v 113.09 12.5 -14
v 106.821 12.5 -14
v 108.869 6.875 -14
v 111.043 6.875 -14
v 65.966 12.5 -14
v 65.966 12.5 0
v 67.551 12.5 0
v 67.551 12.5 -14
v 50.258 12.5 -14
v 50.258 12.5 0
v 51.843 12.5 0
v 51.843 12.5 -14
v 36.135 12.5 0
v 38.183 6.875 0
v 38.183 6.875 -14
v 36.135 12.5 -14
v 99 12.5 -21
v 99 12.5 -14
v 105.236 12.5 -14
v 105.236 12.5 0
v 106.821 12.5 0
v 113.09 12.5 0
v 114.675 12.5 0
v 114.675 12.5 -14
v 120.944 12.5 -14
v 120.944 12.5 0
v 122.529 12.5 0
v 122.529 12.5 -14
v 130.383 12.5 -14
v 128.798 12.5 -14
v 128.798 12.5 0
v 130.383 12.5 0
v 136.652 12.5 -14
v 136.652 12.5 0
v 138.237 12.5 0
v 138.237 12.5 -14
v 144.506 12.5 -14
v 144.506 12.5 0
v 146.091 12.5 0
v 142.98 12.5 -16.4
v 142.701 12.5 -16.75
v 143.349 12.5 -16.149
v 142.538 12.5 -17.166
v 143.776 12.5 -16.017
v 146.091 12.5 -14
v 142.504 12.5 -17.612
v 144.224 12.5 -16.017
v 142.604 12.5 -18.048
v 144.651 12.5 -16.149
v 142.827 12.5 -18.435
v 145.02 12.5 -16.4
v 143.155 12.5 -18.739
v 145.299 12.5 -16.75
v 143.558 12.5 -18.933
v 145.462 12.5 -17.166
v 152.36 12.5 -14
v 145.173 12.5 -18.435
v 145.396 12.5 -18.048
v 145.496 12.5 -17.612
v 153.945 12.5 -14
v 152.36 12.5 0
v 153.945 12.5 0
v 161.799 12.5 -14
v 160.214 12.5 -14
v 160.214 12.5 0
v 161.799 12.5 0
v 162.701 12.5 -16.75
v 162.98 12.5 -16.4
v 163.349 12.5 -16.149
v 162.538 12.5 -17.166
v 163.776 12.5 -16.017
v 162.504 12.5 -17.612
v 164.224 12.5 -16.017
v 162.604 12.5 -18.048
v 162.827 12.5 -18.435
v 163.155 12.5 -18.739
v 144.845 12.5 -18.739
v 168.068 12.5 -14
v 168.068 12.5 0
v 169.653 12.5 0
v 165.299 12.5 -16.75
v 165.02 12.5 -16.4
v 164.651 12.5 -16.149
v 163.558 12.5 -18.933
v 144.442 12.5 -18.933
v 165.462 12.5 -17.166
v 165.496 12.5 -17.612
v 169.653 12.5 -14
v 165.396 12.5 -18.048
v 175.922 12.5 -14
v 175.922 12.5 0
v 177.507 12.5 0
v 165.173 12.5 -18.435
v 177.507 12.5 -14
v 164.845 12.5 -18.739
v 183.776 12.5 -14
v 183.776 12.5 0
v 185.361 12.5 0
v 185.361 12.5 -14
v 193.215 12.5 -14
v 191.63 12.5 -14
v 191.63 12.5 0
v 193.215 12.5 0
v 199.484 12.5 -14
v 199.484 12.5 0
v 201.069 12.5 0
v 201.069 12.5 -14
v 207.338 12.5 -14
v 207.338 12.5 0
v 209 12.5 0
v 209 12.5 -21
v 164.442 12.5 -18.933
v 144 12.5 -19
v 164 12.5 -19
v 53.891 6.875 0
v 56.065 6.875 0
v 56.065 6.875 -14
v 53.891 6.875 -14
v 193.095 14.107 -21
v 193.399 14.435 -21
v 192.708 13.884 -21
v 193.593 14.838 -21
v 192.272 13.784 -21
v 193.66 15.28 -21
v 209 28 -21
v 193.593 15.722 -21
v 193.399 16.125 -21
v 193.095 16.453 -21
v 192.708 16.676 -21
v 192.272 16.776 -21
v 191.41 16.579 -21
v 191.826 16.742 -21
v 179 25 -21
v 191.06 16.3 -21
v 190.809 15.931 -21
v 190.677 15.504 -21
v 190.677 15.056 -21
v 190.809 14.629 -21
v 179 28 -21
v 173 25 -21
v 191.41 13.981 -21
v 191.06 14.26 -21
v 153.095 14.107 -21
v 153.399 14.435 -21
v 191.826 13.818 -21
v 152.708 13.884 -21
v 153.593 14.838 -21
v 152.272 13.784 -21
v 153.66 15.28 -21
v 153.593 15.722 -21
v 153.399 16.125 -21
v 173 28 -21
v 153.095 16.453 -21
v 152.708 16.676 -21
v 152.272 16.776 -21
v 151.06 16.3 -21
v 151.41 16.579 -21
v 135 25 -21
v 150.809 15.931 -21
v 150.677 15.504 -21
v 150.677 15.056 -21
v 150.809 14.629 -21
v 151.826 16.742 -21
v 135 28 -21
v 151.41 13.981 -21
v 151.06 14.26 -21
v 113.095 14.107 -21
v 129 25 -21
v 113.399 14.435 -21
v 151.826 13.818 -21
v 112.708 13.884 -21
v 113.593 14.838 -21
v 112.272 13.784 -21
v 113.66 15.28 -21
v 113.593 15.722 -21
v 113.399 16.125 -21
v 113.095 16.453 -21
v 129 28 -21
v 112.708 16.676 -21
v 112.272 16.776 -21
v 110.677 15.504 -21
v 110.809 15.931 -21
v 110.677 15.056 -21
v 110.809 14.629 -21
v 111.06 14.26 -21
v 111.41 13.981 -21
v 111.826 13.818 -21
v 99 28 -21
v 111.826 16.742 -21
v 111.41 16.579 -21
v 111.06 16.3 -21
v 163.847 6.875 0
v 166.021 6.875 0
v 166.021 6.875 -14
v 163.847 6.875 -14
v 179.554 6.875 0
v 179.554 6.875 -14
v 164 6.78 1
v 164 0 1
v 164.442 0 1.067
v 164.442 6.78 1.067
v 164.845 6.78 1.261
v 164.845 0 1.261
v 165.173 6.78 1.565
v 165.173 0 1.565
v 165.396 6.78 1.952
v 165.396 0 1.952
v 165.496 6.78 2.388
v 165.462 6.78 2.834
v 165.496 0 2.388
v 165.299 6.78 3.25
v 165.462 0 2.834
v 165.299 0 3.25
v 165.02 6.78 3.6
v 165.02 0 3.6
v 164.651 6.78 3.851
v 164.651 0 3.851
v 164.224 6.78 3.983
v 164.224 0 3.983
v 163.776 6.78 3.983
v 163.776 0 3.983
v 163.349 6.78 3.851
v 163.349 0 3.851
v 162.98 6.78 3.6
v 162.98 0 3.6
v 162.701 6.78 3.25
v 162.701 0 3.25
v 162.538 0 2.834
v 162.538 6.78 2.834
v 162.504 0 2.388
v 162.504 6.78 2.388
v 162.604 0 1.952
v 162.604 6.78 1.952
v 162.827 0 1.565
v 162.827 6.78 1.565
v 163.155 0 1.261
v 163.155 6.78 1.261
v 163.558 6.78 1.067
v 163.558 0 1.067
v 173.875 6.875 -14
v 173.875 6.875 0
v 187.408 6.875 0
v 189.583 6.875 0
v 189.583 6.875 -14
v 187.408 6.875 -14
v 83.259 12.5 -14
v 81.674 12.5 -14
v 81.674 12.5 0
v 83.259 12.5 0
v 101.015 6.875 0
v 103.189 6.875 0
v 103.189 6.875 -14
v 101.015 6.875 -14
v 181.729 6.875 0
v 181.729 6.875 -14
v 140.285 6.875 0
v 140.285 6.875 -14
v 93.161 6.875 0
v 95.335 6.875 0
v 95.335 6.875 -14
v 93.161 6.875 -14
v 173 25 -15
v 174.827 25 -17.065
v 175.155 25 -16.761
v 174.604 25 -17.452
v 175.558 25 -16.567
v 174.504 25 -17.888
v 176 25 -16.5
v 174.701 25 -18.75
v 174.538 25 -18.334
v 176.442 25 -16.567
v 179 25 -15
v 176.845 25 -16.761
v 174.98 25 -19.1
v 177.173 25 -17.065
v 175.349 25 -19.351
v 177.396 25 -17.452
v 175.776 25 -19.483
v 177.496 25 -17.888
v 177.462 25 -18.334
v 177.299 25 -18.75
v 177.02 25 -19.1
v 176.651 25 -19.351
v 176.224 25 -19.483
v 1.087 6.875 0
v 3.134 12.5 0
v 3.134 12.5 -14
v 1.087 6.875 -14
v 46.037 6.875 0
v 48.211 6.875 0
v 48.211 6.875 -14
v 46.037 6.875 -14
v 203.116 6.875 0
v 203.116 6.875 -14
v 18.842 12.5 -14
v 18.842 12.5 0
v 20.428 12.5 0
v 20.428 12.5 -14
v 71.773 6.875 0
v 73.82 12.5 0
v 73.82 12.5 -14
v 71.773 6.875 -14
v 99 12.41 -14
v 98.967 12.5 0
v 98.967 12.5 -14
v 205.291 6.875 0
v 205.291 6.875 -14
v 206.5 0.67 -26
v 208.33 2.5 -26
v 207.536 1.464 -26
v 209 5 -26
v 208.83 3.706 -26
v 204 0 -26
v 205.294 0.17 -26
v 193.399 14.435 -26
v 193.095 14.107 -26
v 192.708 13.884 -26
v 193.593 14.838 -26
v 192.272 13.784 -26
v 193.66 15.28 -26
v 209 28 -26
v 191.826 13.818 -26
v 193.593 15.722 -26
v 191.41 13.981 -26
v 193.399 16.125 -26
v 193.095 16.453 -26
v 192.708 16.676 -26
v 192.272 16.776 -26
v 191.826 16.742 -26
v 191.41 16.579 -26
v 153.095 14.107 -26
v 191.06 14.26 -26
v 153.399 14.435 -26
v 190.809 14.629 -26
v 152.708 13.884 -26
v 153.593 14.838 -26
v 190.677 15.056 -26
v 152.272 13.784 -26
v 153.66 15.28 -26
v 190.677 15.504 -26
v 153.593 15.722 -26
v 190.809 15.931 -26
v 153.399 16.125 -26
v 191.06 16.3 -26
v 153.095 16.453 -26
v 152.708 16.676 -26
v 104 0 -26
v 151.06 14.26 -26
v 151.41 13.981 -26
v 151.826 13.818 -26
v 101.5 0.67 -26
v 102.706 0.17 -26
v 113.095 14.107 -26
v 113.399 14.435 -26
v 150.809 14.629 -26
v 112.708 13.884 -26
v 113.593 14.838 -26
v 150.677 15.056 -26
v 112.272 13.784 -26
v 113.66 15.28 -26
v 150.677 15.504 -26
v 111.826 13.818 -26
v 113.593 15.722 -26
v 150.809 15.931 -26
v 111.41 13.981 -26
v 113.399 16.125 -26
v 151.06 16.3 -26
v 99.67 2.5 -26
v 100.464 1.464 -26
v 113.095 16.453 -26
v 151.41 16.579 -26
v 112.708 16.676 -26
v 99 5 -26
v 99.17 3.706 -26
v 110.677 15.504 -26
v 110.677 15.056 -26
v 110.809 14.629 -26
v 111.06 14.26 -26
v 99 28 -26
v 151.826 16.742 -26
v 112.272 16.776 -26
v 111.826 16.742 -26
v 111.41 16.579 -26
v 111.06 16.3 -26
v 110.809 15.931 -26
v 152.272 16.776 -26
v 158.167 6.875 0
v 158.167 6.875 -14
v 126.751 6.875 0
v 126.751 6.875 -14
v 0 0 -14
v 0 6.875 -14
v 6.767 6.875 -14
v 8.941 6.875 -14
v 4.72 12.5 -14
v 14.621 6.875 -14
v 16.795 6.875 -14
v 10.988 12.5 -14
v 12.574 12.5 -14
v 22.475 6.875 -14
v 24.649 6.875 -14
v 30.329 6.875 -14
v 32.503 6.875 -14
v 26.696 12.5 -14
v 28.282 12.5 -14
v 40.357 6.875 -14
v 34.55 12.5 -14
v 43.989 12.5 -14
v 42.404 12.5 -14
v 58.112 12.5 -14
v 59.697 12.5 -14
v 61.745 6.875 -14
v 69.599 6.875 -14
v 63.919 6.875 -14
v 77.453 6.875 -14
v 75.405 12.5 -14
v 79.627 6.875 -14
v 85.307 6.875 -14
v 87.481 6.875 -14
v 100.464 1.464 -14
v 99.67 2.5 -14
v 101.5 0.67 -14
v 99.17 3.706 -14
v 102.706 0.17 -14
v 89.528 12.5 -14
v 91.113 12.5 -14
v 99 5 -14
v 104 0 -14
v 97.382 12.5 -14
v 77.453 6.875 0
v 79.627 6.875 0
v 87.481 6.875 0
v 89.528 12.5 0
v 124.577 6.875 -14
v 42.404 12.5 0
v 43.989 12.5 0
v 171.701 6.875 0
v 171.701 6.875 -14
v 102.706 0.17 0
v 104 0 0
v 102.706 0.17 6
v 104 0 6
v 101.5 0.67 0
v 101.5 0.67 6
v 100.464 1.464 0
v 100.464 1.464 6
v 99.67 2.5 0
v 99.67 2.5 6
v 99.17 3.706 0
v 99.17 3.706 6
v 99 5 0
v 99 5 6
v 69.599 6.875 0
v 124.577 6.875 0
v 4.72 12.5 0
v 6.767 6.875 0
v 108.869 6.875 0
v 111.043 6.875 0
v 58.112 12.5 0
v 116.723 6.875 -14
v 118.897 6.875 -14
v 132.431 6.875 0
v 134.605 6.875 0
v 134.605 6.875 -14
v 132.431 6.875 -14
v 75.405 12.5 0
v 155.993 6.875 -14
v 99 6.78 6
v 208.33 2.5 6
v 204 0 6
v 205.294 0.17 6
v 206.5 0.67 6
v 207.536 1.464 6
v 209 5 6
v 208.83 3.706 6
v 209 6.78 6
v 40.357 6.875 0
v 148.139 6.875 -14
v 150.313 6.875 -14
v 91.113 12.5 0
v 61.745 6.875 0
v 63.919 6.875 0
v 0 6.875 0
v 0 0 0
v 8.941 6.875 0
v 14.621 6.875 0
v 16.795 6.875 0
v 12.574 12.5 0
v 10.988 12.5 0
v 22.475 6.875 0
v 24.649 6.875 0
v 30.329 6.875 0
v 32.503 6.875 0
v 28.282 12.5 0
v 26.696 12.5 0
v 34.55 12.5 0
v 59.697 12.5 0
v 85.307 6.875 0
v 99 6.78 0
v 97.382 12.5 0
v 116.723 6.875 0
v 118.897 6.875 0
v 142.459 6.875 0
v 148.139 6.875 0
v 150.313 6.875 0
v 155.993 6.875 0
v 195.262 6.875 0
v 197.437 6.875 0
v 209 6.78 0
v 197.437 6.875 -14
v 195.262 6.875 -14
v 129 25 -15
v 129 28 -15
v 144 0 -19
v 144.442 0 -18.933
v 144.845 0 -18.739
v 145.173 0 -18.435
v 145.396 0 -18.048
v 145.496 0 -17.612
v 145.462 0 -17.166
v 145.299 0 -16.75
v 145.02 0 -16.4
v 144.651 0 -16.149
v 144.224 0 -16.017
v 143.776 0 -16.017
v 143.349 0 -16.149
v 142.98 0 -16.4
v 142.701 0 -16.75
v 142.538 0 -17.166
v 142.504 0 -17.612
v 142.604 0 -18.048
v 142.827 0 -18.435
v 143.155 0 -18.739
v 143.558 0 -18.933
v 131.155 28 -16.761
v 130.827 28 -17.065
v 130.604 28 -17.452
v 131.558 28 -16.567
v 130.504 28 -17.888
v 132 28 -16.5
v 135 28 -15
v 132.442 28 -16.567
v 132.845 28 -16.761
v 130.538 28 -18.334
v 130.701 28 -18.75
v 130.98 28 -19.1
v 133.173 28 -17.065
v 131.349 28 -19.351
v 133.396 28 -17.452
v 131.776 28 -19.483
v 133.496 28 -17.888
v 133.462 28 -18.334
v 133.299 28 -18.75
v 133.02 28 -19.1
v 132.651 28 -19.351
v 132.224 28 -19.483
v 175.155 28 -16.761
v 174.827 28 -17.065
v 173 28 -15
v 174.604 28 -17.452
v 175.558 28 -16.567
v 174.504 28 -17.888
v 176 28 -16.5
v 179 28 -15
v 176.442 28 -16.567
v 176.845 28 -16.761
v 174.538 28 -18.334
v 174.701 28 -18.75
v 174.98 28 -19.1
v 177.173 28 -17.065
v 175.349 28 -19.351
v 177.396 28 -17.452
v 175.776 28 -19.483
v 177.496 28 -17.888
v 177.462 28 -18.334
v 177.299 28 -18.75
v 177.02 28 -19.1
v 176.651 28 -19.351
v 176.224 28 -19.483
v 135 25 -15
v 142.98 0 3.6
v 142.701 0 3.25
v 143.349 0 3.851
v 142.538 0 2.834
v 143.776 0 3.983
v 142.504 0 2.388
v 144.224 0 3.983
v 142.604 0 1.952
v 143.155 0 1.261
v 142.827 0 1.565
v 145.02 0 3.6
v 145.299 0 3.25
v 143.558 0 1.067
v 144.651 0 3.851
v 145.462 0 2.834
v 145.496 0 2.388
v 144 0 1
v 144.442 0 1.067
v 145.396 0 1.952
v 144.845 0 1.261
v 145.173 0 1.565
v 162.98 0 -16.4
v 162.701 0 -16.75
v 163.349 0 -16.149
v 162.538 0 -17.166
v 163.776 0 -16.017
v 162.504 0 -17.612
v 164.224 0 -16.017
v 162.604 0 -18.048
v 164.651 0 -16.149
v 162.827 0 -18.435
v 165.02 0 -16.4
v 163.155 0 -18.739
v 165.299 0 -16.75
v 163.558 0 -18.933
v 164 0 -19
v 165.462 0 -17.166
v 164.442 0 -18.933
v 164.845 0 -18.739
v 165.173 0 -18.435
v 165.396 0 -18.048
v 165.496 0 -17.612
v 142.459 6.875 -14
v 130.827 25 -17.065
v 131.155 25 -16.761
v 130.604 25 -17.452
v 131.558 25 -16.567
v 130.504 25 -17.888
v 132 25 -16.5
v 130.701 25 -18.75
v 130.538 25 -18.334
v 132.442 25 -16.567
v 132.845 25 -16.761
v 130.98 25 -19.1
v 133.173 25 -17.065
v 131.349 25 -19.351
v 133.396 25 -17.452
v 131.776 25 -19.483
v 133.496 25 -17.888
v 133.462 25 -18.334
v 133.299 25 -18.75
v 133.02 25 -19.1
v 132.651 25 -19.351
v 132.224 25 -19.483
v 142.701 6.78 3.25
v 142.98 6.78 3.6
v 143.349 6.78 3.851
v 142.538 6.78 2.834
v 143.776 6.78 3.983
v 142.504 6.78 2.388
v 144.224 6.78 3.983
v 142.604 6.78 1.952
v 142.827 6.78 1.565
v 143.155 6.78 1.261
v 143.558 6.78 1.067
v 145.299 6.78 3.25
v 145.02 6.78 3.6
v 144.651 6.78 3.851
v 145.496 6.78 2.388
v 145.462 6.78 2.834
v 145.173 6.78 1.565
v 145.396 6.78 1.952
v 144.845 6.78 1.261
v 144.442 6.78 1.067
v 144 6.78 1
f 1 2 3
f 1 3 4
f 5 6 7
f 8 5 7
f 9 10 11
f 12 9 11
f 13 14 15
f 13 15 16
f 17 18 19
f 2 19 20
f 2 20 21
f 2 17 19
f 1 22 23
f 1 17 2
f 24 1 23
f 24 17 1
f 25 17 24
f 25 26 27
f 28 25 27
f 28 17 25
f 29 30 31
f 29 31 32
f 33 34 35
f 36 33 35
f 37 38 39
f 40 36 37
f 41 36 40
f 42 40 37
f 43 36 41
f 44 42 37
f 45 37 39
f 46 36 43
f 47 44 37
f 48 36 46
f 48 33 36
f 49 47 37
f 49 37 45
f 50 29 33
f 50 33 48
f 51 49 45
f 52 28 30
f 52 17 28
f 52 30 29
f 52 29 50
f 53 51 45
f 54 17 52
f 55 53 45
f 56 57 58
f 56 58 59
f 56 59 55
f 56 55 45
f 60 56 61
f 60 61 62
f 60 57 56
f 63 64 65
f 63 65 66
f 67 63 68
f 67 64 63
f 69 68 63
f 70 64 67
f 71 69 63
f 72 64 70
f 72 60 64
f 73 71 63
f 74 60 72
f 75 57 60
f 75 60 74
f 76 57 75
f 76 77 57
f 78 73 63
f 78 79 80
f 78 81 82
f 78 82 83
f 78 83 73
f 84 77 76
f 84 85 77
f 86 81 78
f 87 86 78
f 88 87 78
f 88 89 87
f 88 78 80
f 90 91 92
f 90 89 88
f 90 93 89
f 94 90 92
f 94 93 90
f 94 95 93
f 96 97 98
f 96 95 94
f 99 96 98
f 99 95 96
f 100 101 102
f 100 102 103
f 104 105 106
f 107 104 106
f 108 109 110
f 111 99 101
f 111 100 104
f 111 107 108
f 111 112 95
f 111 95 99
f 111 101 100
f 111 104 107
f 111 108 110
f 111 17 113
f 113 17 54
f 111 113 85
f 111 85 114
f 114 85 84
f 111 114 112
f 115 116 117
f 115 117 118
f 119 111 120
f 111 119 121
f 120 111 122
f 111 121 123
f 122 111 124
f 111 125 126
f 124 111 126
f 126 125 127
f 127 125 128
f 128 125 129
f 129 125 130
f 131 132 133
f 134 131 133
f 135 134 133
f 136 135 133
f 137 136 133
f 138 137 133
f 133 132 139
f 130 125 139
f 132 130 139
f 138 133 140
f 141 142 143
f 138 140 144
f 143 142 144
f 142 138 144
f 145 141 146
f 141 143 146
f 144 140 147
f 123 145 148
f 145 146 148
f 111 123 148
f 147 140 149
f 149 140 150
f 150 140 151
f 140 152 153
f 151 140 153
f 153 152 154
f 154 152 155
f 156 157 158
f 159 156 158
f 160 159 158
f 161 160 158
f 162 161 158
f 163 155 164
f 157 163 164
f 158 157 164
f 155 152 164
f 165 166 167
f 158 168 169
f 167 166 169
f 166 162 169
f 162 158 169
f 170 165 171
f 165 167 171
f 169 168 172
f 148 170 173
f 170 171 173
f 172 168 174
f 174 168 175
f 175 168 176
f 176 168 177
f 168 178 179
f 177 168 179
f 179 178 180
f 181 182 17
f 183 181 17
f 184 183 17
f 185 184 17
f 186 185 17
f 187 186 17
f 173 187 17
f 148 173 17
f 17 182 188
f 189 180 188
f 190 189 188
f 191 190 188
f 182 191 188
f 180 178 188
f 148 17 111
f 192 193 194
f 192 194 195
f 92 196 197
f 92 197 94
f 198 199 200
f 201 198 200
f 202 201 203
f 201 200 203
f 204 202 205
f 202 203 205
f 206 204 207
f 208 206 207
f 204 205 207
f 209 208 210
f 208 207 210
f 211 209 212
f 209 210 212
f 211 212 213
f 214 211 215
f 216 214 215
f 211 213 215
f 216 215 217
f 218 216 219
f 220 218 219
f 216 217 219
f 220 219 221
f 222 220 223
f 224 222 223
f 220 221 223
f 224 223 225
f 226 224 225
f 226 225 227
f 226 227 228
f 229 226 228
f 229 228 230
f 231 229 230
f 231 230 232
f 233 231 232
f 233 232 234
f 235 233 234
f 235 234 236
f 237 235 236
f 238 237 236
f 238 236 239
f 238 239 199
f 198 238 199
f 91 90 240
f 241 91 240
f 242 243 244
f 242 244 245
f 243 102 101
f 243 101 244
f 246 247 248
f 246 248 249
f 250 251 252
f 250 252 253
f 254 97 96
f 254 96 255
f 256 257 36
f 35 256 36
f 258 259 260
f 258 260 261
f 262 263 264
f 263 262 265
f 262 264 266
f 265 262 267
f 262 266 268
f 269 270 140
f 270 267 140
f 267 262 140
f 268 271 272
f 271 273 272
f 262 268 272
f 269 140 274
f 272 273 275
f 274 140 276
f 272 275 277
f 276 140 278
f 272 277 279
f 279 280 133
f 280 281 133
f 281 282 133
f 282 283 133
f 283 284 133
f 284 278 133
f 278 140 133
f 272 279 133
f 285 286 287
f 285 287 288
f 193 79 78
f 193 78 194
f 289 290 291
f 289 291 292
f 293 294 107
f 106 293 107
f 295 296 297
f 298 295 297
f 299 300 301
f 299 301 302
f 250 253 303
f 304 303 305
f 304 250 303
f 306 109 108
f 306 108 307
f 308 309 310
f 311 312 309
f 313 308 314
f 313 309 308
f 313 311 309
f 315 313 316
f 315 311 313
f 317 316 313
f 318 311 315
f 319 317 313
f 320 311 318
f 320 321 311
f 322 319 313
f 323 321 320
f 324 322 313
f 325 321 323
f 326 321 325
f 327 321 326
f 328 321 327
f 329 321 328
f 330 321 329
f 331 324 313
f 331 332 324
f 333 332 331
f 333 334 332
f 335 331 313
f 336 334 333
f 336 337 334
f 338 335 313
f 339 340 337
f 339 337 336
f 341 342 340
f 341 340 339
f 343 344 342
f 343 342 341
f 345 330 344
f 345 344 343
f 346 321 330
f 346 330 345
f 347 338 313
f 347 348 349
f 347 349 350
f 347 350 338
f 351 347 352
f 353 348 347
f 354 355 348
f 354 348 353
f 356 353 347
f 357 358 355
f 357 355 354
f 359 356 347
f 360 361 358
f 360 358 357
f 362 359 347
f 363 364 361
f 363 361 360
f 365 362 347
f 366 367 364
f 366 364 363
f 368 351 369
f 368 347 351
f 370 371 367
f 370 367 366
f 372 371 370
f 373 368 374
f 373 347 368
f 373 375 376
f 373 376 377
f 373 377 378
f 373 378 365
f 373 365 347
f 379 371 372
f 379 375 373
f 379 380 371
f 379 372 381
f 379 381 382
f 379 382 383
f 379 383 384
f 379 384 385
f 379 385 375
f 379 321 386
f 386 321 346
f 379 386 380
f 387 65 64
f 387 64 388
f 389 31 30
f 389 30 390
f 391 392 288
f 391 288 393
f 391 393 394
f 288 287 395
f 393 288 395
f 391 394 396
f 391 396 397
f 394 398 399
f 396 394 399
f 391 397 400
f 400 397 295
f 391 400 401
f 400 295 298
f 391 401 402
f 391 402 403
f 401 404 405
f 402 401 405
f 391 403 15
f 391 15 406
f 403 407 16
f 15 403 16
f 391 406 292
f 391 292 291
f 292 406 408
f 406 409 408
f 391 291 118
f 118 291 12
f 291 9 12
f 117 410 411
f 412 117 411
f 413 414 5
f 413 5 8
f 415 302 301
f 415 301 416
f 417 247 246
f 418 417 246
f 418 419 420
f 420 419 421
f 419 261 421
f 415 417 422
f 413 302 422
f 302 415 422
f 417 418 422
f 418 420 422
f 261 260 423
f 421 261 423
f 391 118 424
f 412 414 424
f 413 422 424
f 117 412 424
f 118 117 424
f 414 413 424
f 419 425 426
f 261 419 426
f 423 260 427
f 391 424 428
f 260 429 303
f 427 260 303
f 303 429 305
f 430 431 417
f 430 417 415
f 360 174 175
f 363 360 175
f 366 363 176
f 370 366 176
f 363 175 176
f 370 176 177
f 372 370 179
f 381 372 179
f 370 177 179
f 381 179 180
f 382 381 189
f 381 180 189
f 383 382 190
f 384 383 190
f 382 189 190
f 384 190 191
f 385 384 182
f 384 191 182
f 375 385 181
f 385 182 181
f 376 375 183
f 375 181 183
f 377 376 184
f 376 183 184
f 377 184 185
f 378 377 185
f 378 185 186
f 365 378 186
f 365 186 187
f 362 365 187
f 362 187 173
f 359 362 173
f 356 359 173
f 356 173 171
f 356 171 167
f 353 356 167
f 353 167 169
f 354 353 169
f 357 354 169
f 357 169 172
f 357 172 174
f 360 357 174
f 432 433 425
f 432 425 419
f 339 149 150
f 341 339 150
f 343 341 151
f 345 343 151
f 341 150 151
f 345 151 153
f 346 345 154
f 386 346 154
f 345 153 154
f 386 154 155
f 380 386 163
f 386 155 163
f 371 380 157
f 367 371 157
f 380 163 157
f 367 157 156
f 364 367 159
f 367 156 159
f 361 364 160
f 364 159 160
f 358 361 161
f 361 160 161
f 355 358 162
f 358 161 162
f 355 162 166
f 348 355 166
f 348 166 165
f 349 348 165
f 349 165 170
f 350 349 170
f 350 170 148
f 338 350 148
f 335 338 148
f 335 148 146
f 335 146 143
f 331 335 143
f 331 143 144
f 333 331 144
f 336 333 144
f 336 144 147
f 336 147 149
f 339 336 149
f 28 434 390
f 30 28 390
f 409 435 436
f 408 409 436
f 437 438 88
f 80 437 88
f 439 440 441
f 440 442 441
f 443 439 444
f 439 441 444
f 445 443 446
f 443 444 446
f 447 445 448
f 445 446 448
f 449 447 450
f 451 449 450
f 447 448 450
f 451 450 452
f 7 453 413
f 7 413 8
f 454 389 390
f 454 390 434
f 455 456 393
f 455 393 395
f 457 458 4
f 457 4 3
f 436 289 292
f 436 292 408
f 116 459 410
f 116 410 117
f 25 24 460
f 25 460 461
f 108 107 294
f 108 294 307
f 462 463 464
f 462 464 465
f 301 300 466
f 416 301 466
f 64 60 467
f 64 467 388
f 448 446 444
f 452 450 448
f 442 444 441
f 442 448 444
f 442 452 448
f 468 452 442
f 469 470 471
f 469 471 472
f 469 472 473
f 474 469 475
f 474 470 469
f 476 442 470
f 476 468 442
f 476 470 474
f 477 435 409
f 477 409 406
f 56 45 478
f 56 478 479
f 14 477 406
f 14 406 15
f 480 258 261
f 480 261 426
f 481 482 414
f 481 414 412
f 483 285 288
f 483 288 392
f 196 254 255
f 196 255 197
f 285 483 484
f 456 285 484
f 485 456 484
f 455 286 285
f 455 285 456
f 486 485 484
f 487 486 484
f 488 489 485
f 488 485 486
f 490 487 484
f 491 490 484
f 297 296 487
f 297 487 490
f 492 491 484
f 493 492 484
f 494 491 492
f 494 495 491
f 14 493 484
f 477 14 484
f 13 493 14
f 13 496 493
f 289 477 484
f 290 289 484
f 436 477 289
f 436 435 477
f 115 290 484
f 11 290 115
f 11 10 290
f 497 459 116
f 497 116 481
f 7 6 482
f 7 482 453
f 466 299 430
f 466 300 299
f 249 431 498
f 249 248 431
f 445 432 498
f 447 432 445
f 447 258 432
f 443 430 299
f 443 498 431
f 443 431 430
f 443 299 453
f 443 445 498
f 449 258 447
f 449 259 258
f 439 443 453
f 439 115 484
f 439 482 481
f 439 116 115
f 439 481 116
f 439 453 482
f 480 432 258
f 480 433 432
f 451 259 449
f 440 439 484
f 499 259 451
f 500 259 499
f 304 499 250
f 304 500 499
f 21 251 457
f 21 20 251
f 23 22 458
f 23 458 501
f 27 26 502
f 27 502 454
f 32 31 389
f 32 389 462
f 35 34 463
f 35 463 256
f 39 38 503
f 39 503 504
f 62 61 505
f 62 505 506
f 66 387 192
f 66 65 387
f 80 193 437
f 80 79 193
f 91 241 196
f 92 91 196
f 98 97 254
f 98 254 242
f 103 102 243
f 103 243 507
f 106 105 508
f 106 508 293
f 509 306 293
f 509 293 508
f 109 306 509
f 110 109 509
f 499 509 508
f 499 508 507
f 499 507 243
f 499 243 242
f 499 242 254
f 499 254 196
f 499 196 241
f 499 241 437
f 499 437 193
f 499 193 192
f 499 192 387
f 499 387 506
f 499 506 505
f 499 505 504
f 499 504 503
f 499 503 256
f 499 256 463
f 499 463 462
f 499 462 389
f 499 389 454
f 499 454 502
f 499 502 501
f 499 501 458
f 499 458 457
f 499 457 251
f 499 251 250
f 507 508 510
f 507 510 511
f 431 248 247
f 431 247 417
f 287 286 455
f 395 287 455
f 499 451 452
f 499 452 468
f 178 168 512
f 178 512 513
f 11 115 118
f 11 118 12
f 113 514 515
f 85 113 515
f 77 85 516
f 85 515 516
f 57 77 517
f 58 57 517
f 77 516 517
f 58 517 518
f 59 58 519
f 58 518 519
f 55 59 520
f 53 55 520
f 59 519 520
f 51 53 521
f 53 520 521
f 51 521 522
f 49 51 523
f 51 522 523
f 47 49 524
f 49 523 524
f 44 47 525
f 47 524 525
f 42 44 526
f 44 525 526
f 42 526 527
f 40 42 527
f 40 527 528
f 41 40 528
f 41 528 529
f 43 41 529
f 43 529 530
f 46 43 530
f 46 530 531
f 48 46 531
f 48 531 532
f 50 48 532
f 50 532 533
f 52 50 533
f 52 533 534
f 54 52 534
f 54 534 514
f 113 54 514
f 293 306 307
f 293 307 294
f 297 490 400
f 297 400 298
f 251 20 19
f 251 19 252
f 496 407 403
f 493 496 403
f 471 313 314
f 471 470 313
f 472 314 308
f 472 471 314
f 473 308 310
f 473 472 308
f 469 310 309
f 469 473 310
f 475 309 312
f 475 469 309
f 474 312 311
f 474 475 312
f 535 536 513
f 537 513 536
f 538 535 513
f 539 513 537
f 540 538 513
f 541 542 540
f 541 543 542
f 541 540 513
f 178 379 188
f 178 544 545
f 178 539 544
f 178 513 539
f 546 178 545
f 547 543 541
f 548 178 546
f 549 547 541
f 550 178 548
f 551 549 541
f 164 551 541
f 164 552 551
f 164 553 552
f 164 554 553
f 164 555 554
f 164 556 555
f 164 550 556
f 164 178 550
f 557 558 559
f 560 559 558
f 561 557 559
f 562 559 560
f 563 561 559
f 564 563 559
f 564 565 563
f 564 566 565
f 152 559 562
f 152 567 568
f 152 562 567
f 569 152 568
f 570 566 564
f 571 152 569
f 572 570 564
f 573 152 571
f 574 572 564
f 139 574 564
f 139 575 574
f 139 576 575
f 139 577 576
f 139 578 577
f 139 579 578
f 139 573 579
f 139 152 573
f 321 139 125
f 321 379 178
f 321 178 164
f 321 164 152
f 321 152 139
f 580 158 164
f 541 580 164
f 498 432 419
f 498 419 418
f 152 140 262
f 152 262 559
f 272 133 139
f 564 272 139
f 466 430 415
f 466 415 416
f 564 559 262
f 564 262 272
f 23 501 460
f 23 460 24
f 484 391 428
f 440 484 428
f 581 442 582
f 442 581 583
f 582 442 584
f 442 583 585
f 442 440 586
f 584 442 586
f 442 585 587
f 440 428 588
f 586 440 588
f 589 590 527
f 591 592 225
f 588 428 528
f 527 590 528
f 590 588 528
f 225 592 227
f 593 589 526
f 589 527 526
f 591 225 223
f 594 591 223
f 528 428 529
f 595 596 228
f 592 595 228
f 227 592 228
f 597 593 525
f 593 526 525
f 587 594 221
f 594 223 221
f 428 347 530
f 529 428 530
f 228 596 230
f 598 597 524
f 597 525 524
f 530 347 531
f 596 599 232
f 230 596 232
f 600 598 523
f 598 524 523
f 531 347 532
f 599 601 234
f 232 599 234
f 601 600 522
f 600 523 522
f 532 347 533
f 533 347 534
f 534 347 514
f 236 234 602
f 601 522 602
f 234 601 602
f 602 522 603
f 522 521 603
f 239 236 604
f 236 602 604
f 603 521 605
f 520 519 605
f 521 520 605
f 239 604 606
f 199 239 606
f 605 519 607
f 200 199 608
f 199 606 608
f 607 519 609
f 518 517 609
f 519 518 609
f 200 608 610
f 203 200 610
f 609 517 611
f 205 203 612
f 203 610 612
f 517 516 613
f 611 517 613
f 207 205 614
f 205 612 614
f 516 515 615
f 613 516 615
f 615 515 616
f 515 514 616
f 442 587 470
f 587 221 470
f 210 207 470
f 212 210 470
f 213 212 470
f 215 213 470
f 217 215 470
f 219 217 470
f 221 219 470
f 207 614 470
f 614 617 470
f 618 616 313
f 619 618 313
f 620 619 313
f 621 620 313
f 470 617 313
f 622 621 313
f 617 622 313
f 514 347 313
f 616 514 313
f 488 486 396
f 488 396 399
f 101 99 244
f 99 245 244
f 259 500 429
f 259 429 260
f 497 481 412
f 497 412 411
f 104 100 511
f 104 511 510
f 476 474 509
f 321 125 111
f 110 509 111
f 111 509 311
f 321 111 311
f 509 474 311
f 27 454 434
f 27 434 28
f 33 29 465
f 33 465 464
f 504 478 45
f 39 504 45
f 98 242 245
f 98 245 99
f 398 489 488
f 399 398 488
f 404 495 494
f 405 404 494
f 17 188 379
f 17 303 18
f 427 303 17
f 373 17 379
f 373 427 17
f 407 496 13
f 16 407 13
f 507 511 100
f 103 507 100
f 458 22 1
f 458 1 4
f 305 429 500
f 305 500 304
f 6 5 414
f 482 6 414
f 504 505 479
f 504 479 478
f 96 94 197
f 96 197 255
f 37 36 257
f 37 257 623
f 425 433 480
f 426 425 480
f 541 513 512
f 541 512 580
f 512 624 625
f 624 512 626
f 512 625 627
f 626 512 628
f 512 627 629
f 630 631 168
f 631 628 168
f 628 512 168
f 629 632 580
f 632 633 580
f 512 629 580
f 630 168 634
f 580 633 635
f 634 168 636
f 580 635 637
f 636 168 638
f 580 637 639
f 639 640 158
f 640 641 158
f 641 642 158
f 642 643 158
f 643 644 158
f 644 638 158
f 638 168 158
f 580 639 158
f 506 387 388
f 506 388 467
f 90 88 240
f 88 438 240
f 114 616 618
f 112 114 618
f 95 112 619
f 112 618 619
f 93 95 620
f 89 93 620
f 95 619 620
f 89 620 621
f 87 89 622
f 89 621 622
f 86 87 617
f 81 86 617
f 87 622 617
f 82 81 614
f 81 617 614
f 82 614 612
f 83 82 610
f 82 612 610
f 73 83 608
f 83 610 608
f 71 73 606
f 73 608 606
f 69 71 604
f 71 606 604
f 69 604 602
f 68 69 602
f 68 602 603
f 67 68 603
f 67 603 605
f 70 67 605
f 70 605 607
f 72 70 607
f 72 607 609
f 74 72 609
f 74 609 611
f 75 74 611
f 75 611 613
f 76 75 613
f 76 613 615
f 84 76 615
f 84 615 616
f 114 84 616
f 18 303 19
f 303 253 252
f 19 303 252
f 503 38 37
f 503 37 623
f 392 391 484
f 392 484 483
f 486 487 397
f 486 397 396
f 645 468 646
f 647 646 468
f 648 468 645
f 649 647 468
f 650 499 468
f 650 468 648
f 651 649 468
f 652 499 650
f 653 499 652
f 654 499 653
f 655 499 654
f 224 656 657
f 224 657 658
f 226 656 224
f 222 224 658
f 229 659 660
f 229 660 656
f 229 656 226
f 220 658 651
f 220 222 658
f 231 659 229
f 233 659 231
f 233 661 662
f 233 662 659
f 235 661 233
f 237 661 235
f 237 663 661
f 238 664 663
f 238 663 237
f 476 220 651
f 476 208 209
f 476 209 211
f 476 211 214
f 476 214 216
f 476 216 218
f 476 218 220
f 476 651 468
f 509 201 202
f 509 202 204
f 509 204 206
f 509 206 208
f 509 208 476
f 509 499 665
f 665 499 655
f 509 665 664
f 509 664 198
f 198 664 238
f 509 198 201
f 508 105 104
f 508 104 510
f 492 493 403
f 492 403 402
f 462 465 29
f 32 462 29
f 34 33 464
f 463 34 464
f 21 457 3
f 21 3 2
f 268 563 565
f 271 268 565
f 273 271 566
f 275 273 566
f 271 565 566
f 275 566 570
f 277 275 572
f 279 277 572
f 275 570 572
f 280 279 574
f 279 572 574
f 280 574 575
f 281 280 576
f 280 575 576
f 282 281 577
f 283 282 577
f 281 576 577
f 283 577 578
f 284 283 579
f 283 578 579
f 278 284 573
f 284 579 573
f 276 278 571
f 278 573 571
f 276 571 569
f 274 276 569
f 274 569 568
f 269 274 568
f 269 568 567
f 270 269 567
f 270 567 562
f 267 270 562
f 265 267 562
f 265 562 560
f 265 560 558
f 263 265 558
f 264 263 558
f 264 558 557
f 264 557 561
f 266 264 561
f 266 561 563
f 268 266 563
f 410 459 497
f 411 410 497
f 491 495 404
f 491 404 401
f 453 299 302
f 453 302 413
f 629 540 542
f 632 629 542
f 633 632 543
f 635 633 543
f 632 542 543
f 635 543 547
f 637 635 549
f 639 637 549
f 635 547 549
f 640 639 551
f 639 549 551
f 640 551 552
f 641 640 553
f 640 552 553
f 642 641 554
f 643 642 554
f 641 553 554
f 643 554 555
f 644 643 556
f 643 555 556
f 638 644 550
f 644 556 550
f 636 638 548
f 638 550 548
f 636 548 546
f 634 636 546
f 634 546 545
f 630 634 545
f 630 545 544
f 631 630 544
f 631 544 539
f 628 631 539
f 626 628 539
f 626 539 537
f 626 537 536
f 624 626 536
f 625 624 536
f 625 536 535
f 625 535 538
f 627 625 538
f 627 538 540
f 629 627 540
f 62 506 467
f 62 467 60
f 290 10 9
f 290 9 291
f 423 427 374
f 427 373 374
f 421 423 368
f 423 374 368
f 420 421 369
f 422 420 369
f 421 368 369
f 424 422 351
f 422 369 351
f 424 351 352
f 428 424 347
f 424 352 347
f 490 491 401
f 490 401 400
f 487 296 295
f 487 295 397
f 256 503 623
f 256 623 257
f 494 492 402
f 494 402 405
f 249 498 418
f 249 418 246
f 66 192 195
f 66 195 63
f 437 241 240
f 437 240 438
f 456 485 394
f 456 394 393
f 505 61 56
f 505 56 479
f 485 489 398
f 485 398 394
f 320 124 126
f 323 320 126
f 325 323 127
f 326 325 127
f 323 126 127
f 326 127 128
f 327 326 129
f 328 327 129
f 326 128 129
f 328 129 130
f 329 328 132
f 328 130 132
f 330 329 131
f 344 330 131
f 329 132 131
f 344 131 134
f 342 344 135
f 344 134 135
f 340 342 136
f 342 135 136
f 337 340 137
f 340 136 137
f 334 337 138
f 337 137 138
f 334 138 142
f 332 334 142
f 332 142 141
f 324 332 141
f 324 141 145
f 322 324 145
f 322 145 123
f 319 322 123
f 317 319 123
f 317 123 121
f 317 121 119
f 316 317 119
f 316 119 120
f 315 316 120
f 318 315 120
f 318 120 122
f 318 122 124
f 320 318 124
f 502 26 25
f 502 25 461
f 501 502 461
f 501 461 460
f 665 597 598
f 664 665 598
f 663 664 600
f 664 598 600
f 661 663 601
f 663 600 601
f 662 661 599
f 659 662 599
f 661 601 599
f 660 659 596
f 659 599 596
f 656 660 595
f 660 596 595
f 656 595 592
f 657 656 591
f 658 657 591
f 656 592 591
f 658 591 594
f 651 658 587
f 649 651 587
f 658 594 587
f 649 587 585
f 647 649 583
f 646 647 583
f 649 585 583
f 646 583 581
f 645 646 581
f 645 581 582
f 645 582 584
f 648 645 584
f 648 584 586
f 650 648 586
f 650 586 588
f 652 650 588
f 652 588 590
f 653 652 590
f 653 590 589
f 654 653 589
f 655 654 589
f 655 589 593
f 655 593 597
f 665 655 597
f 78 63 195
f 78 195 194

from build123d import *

# Parameters (mm, degrees)
BLANKSKE_W          = 209
BLANKSKE_H          = 12.5
BLANK_DEPTH         = 14
TOOTHCUTSIM_DEPTH   = 210.841011244
TEETHCUTS_COUNT     = 27
TEETHCUTS_PITCH     = 7.853981625
SKETCH2_W           = 110
SKETCH2_H           = 6.78
BOSS_EXTRUDE2_DEPTH = 7
SKETCH3_W           = 110
SKETCH3_H           = 56
BOSS_EXTRUDE3_DEPTH = 5
SKETCH4_W           = 110
SKETCH4_H           = 6.78
BOSS_EXTRUDE4_DEPTH = 7
SKETCH7_W           = 110
SKETCH7_H           = 6.78
BOSS_EXTRUDE5_DEPTH = 6
SKETCH8_W           = 110
SKETCH8_H           = 6.78
BOSS_EXTRUDE6_DEPTH = 20
SKETCH9_W           = 110
SKETCH9_H           = 7
BOSS_EXTRUDE7_DEPTH = 5.72
SKETCH5_R           = 1.5
CUT_EXTRUDE1_DEPTH  = 218.928887484
SKETCH6_R           = 1.5
CUT_EXTRUDE2_DEPTH  = 219.050452877
FILLET1_R           = 5
SKETCH12_W          = 119.263366365
SKETCH12_H          = 39.167998327
CUT_EXTRUDE3_DEPTH  = 28
SKETCH13_W          = 6
SKETCH13_H          = 3
BOSS_EXTRUDE8_DEPTH = 6
SKETCH14_R          = 1.5
CUT_EXTRUDE4_DEPTH  = 6


with BuildPart() as part:
    # BlankSke → Blank (new body)
    with BuildSketch(Plane.XY):
        with Locations((104.5, 6.25)):
            Rectangle(BLANKSKE_W, BLANKSKE_H)
    extrude(amount=-BLANK_DEPTH)

    # TooCutSkeSim → ToothCutSim (cut, through all)
    with BuildSketch(Plane.XY):
        Polygon((1.087088424, 6.875), (-1.087088424, 6.875), (-3.143665836, 12.5254), (3.143665836, 12.5254), align=None)
    toothcutsim = extrude(amount=-TOOTHCUTSIM_DEPTH, mode=Mode.SUBTRACT)

    # TeethCuts: ToothCutSim ×27
    with Locations(*[(i * TEETHCUTS_PITCH, 0, 0) for i in range(1, TEETHCUTS_COUNT)]):
        add(toothcutsim, mode=Mode.SUBTRACT)

    # Sketch2 → Boss-Extrude2 (add)
    with BuildSketch(Plane(origin=(0, 0, -14), x_dir=(-1, 0, 0), z_dir=(0, 0, -1))):
        with Locations((-154, 3.39)):
            Rectangle(SKETCH2_W, SKETCH2_H)
    extrude(amount=BOSS_EXTRUDE2_DEPTH)

    # Sketch3 → Boss-Extrude3 (add)
    with BuildSketch(Plane(origin=(0, 0, -21), x_dir=(-1, 0, 0), z_dir=(0, 0, -1))):
        with Locations((-154, 28)):
            Rectangle(SKETCH3_W, SKETCH3_H)
    extrude(amount=BOSS_EXTRUDE3_DEPTH)

    # Sketch4 → Boss-Extrude4 (add)
    with BuildSketch(Plane.XY.offset(-21)):
        with Locations((154, 52.61)):
            Rectangle(SKETCH4_W, SKETCH4_H)
    extrude(amount=BOSS_EXTRUDE4_DEPTH)

    # Sketch7 → Boss-Extrude5 (add)
    with BuildSketch(Plane.XY):
        with Locations((154, 3.39)):
            Rectangle(SKETCH7_W, SKETCH7_H)
    extrude(amount=BOSS_EXTRUDE5_DEPTH)

    # Sketch8 → Boss-Extrude6 (add)
    with BuildSketch(Plane.XY.offset(-14)):
        with Locations((154, 52.61)):
            Rectangle(SKETCH8_W, SKETCH8_H)
    extrude(amount=BOSS_EXTRUDE6_DEPTH)

    # Sketch9 → Boss-Extrude7 (add)
    with BuildSketch(Plane(origin=(0, 6.78, 0), x_dir=(1, 0, 0), z_dir=(0, 1, 0))):
        with Locations((154, 17.5)):
            Rectangle(SKETCH9_W, SKETCH9_H)
    extrude(amount=BOSS_EXTRUDE7_DEPTH)

    # Sketch5 → Cut-Extrude1 (cut, through all)
    with BuildSketch(Plane.XZ):
        with Locations(Location((164, -17.5, 0), (0, 0, 270))):
            Circle(SKETCH5_R)
        with Locations(Location((144, -17.5, 0), (0, 0, 270))):
            Circle(SKETCH5_R)
        with Locations(Location((144, 2.5, 0), (0, 0, 270))):
            Circle(SKETCH5_R)
        with Locations(Location((164, 2.5, 0), (0, 0, 270))):
            Circle(SKETCH5_R)
    extrude(amount=-CUT_EXTRUDE1_DEPTH, mode=Mode.SUBTRACT)

    # Sketch6 → Cut-Extrude2 (cut, through all)
    with BuildSketch(Plane.XY.offset(-21)):
        with Locations((112.16, 15.28)):
            Circle(SKETCH6_R)
        with Locations((152.16, 15.28)):
            Circle(SKETCH6_R)
        with Locations((192.16, 15.28)):
            Circle(SKETCH6_R)
        with Locations((112.16, 45.28)):
            Circle(SKETCH6_R)
        with Locations((192.16, 45.28)):
            Circle(SKETCH6_R)
        with Locations((152.16, 45.28)):
            Circle(SKETCH6_R)
    extrude(amount=-CUT_EXTRUDE2_DEPTH, mode=Mode.SUBTRACT)

    # Fillet1
    fillet1_edges = [part.edges().sort_by_distance(p)[0] for p in [
        (99, 0, -20),
        (209, 56, -10),
        (99, 56, -10),
        (99, 0, 3),
        (209, 0, -10),
    ]]
    fillet(fillet1_edges, radius=FILLET1_R)

    # Sketch12 → Cut-Extrude3 (cut)
    with BuildSketch(Plane(origin=(0, 56, 0), x_dir=(1, 0, 0), z_dir=(0, 1, 0))):
        with Locations((155.252120093, 7.537257659)):
            Rectangle(SKETCH12_W, SKETCH12_H)
    extrude(amount=-CUT_EXTRUDE3_DEPTH, mode=Mode.SUBTRACT)

    # Sketch13 → Boss-Extrude8 (add)
    with BuildSketch(Plane.XY.offset(-21)):
        with Locations((176, 26.5)):
            Rectangle(SKETCH13_W, SKETCH13_H)
        with Locations((132, 26.5)):
            Rectangle(SKETCH13_W, SKETCH13_H)
    extrude(amount=BOSS_EXTRUDE8_DEPTH)

    # Sketch14 → Cut-Extrude4 (cut)
    with BuildSketch(Plane(origin=(0, 28, 0), x_dir=(-1, 0, 0), z_dir=(0, 1, 0))):
        with Locations(Location((-132, -18, 0), (0, 0, 90))):
            Circle(SKETCH14_R)
        with Locations(Location((-176, -18, 0), (0, 0, 90))):
            Circle(SKETCH14_R)
    extrude(amount=-CUT_EXTRUDE4_DEPTH, mode=Mode.SUBTRACT)


solid = part.part
